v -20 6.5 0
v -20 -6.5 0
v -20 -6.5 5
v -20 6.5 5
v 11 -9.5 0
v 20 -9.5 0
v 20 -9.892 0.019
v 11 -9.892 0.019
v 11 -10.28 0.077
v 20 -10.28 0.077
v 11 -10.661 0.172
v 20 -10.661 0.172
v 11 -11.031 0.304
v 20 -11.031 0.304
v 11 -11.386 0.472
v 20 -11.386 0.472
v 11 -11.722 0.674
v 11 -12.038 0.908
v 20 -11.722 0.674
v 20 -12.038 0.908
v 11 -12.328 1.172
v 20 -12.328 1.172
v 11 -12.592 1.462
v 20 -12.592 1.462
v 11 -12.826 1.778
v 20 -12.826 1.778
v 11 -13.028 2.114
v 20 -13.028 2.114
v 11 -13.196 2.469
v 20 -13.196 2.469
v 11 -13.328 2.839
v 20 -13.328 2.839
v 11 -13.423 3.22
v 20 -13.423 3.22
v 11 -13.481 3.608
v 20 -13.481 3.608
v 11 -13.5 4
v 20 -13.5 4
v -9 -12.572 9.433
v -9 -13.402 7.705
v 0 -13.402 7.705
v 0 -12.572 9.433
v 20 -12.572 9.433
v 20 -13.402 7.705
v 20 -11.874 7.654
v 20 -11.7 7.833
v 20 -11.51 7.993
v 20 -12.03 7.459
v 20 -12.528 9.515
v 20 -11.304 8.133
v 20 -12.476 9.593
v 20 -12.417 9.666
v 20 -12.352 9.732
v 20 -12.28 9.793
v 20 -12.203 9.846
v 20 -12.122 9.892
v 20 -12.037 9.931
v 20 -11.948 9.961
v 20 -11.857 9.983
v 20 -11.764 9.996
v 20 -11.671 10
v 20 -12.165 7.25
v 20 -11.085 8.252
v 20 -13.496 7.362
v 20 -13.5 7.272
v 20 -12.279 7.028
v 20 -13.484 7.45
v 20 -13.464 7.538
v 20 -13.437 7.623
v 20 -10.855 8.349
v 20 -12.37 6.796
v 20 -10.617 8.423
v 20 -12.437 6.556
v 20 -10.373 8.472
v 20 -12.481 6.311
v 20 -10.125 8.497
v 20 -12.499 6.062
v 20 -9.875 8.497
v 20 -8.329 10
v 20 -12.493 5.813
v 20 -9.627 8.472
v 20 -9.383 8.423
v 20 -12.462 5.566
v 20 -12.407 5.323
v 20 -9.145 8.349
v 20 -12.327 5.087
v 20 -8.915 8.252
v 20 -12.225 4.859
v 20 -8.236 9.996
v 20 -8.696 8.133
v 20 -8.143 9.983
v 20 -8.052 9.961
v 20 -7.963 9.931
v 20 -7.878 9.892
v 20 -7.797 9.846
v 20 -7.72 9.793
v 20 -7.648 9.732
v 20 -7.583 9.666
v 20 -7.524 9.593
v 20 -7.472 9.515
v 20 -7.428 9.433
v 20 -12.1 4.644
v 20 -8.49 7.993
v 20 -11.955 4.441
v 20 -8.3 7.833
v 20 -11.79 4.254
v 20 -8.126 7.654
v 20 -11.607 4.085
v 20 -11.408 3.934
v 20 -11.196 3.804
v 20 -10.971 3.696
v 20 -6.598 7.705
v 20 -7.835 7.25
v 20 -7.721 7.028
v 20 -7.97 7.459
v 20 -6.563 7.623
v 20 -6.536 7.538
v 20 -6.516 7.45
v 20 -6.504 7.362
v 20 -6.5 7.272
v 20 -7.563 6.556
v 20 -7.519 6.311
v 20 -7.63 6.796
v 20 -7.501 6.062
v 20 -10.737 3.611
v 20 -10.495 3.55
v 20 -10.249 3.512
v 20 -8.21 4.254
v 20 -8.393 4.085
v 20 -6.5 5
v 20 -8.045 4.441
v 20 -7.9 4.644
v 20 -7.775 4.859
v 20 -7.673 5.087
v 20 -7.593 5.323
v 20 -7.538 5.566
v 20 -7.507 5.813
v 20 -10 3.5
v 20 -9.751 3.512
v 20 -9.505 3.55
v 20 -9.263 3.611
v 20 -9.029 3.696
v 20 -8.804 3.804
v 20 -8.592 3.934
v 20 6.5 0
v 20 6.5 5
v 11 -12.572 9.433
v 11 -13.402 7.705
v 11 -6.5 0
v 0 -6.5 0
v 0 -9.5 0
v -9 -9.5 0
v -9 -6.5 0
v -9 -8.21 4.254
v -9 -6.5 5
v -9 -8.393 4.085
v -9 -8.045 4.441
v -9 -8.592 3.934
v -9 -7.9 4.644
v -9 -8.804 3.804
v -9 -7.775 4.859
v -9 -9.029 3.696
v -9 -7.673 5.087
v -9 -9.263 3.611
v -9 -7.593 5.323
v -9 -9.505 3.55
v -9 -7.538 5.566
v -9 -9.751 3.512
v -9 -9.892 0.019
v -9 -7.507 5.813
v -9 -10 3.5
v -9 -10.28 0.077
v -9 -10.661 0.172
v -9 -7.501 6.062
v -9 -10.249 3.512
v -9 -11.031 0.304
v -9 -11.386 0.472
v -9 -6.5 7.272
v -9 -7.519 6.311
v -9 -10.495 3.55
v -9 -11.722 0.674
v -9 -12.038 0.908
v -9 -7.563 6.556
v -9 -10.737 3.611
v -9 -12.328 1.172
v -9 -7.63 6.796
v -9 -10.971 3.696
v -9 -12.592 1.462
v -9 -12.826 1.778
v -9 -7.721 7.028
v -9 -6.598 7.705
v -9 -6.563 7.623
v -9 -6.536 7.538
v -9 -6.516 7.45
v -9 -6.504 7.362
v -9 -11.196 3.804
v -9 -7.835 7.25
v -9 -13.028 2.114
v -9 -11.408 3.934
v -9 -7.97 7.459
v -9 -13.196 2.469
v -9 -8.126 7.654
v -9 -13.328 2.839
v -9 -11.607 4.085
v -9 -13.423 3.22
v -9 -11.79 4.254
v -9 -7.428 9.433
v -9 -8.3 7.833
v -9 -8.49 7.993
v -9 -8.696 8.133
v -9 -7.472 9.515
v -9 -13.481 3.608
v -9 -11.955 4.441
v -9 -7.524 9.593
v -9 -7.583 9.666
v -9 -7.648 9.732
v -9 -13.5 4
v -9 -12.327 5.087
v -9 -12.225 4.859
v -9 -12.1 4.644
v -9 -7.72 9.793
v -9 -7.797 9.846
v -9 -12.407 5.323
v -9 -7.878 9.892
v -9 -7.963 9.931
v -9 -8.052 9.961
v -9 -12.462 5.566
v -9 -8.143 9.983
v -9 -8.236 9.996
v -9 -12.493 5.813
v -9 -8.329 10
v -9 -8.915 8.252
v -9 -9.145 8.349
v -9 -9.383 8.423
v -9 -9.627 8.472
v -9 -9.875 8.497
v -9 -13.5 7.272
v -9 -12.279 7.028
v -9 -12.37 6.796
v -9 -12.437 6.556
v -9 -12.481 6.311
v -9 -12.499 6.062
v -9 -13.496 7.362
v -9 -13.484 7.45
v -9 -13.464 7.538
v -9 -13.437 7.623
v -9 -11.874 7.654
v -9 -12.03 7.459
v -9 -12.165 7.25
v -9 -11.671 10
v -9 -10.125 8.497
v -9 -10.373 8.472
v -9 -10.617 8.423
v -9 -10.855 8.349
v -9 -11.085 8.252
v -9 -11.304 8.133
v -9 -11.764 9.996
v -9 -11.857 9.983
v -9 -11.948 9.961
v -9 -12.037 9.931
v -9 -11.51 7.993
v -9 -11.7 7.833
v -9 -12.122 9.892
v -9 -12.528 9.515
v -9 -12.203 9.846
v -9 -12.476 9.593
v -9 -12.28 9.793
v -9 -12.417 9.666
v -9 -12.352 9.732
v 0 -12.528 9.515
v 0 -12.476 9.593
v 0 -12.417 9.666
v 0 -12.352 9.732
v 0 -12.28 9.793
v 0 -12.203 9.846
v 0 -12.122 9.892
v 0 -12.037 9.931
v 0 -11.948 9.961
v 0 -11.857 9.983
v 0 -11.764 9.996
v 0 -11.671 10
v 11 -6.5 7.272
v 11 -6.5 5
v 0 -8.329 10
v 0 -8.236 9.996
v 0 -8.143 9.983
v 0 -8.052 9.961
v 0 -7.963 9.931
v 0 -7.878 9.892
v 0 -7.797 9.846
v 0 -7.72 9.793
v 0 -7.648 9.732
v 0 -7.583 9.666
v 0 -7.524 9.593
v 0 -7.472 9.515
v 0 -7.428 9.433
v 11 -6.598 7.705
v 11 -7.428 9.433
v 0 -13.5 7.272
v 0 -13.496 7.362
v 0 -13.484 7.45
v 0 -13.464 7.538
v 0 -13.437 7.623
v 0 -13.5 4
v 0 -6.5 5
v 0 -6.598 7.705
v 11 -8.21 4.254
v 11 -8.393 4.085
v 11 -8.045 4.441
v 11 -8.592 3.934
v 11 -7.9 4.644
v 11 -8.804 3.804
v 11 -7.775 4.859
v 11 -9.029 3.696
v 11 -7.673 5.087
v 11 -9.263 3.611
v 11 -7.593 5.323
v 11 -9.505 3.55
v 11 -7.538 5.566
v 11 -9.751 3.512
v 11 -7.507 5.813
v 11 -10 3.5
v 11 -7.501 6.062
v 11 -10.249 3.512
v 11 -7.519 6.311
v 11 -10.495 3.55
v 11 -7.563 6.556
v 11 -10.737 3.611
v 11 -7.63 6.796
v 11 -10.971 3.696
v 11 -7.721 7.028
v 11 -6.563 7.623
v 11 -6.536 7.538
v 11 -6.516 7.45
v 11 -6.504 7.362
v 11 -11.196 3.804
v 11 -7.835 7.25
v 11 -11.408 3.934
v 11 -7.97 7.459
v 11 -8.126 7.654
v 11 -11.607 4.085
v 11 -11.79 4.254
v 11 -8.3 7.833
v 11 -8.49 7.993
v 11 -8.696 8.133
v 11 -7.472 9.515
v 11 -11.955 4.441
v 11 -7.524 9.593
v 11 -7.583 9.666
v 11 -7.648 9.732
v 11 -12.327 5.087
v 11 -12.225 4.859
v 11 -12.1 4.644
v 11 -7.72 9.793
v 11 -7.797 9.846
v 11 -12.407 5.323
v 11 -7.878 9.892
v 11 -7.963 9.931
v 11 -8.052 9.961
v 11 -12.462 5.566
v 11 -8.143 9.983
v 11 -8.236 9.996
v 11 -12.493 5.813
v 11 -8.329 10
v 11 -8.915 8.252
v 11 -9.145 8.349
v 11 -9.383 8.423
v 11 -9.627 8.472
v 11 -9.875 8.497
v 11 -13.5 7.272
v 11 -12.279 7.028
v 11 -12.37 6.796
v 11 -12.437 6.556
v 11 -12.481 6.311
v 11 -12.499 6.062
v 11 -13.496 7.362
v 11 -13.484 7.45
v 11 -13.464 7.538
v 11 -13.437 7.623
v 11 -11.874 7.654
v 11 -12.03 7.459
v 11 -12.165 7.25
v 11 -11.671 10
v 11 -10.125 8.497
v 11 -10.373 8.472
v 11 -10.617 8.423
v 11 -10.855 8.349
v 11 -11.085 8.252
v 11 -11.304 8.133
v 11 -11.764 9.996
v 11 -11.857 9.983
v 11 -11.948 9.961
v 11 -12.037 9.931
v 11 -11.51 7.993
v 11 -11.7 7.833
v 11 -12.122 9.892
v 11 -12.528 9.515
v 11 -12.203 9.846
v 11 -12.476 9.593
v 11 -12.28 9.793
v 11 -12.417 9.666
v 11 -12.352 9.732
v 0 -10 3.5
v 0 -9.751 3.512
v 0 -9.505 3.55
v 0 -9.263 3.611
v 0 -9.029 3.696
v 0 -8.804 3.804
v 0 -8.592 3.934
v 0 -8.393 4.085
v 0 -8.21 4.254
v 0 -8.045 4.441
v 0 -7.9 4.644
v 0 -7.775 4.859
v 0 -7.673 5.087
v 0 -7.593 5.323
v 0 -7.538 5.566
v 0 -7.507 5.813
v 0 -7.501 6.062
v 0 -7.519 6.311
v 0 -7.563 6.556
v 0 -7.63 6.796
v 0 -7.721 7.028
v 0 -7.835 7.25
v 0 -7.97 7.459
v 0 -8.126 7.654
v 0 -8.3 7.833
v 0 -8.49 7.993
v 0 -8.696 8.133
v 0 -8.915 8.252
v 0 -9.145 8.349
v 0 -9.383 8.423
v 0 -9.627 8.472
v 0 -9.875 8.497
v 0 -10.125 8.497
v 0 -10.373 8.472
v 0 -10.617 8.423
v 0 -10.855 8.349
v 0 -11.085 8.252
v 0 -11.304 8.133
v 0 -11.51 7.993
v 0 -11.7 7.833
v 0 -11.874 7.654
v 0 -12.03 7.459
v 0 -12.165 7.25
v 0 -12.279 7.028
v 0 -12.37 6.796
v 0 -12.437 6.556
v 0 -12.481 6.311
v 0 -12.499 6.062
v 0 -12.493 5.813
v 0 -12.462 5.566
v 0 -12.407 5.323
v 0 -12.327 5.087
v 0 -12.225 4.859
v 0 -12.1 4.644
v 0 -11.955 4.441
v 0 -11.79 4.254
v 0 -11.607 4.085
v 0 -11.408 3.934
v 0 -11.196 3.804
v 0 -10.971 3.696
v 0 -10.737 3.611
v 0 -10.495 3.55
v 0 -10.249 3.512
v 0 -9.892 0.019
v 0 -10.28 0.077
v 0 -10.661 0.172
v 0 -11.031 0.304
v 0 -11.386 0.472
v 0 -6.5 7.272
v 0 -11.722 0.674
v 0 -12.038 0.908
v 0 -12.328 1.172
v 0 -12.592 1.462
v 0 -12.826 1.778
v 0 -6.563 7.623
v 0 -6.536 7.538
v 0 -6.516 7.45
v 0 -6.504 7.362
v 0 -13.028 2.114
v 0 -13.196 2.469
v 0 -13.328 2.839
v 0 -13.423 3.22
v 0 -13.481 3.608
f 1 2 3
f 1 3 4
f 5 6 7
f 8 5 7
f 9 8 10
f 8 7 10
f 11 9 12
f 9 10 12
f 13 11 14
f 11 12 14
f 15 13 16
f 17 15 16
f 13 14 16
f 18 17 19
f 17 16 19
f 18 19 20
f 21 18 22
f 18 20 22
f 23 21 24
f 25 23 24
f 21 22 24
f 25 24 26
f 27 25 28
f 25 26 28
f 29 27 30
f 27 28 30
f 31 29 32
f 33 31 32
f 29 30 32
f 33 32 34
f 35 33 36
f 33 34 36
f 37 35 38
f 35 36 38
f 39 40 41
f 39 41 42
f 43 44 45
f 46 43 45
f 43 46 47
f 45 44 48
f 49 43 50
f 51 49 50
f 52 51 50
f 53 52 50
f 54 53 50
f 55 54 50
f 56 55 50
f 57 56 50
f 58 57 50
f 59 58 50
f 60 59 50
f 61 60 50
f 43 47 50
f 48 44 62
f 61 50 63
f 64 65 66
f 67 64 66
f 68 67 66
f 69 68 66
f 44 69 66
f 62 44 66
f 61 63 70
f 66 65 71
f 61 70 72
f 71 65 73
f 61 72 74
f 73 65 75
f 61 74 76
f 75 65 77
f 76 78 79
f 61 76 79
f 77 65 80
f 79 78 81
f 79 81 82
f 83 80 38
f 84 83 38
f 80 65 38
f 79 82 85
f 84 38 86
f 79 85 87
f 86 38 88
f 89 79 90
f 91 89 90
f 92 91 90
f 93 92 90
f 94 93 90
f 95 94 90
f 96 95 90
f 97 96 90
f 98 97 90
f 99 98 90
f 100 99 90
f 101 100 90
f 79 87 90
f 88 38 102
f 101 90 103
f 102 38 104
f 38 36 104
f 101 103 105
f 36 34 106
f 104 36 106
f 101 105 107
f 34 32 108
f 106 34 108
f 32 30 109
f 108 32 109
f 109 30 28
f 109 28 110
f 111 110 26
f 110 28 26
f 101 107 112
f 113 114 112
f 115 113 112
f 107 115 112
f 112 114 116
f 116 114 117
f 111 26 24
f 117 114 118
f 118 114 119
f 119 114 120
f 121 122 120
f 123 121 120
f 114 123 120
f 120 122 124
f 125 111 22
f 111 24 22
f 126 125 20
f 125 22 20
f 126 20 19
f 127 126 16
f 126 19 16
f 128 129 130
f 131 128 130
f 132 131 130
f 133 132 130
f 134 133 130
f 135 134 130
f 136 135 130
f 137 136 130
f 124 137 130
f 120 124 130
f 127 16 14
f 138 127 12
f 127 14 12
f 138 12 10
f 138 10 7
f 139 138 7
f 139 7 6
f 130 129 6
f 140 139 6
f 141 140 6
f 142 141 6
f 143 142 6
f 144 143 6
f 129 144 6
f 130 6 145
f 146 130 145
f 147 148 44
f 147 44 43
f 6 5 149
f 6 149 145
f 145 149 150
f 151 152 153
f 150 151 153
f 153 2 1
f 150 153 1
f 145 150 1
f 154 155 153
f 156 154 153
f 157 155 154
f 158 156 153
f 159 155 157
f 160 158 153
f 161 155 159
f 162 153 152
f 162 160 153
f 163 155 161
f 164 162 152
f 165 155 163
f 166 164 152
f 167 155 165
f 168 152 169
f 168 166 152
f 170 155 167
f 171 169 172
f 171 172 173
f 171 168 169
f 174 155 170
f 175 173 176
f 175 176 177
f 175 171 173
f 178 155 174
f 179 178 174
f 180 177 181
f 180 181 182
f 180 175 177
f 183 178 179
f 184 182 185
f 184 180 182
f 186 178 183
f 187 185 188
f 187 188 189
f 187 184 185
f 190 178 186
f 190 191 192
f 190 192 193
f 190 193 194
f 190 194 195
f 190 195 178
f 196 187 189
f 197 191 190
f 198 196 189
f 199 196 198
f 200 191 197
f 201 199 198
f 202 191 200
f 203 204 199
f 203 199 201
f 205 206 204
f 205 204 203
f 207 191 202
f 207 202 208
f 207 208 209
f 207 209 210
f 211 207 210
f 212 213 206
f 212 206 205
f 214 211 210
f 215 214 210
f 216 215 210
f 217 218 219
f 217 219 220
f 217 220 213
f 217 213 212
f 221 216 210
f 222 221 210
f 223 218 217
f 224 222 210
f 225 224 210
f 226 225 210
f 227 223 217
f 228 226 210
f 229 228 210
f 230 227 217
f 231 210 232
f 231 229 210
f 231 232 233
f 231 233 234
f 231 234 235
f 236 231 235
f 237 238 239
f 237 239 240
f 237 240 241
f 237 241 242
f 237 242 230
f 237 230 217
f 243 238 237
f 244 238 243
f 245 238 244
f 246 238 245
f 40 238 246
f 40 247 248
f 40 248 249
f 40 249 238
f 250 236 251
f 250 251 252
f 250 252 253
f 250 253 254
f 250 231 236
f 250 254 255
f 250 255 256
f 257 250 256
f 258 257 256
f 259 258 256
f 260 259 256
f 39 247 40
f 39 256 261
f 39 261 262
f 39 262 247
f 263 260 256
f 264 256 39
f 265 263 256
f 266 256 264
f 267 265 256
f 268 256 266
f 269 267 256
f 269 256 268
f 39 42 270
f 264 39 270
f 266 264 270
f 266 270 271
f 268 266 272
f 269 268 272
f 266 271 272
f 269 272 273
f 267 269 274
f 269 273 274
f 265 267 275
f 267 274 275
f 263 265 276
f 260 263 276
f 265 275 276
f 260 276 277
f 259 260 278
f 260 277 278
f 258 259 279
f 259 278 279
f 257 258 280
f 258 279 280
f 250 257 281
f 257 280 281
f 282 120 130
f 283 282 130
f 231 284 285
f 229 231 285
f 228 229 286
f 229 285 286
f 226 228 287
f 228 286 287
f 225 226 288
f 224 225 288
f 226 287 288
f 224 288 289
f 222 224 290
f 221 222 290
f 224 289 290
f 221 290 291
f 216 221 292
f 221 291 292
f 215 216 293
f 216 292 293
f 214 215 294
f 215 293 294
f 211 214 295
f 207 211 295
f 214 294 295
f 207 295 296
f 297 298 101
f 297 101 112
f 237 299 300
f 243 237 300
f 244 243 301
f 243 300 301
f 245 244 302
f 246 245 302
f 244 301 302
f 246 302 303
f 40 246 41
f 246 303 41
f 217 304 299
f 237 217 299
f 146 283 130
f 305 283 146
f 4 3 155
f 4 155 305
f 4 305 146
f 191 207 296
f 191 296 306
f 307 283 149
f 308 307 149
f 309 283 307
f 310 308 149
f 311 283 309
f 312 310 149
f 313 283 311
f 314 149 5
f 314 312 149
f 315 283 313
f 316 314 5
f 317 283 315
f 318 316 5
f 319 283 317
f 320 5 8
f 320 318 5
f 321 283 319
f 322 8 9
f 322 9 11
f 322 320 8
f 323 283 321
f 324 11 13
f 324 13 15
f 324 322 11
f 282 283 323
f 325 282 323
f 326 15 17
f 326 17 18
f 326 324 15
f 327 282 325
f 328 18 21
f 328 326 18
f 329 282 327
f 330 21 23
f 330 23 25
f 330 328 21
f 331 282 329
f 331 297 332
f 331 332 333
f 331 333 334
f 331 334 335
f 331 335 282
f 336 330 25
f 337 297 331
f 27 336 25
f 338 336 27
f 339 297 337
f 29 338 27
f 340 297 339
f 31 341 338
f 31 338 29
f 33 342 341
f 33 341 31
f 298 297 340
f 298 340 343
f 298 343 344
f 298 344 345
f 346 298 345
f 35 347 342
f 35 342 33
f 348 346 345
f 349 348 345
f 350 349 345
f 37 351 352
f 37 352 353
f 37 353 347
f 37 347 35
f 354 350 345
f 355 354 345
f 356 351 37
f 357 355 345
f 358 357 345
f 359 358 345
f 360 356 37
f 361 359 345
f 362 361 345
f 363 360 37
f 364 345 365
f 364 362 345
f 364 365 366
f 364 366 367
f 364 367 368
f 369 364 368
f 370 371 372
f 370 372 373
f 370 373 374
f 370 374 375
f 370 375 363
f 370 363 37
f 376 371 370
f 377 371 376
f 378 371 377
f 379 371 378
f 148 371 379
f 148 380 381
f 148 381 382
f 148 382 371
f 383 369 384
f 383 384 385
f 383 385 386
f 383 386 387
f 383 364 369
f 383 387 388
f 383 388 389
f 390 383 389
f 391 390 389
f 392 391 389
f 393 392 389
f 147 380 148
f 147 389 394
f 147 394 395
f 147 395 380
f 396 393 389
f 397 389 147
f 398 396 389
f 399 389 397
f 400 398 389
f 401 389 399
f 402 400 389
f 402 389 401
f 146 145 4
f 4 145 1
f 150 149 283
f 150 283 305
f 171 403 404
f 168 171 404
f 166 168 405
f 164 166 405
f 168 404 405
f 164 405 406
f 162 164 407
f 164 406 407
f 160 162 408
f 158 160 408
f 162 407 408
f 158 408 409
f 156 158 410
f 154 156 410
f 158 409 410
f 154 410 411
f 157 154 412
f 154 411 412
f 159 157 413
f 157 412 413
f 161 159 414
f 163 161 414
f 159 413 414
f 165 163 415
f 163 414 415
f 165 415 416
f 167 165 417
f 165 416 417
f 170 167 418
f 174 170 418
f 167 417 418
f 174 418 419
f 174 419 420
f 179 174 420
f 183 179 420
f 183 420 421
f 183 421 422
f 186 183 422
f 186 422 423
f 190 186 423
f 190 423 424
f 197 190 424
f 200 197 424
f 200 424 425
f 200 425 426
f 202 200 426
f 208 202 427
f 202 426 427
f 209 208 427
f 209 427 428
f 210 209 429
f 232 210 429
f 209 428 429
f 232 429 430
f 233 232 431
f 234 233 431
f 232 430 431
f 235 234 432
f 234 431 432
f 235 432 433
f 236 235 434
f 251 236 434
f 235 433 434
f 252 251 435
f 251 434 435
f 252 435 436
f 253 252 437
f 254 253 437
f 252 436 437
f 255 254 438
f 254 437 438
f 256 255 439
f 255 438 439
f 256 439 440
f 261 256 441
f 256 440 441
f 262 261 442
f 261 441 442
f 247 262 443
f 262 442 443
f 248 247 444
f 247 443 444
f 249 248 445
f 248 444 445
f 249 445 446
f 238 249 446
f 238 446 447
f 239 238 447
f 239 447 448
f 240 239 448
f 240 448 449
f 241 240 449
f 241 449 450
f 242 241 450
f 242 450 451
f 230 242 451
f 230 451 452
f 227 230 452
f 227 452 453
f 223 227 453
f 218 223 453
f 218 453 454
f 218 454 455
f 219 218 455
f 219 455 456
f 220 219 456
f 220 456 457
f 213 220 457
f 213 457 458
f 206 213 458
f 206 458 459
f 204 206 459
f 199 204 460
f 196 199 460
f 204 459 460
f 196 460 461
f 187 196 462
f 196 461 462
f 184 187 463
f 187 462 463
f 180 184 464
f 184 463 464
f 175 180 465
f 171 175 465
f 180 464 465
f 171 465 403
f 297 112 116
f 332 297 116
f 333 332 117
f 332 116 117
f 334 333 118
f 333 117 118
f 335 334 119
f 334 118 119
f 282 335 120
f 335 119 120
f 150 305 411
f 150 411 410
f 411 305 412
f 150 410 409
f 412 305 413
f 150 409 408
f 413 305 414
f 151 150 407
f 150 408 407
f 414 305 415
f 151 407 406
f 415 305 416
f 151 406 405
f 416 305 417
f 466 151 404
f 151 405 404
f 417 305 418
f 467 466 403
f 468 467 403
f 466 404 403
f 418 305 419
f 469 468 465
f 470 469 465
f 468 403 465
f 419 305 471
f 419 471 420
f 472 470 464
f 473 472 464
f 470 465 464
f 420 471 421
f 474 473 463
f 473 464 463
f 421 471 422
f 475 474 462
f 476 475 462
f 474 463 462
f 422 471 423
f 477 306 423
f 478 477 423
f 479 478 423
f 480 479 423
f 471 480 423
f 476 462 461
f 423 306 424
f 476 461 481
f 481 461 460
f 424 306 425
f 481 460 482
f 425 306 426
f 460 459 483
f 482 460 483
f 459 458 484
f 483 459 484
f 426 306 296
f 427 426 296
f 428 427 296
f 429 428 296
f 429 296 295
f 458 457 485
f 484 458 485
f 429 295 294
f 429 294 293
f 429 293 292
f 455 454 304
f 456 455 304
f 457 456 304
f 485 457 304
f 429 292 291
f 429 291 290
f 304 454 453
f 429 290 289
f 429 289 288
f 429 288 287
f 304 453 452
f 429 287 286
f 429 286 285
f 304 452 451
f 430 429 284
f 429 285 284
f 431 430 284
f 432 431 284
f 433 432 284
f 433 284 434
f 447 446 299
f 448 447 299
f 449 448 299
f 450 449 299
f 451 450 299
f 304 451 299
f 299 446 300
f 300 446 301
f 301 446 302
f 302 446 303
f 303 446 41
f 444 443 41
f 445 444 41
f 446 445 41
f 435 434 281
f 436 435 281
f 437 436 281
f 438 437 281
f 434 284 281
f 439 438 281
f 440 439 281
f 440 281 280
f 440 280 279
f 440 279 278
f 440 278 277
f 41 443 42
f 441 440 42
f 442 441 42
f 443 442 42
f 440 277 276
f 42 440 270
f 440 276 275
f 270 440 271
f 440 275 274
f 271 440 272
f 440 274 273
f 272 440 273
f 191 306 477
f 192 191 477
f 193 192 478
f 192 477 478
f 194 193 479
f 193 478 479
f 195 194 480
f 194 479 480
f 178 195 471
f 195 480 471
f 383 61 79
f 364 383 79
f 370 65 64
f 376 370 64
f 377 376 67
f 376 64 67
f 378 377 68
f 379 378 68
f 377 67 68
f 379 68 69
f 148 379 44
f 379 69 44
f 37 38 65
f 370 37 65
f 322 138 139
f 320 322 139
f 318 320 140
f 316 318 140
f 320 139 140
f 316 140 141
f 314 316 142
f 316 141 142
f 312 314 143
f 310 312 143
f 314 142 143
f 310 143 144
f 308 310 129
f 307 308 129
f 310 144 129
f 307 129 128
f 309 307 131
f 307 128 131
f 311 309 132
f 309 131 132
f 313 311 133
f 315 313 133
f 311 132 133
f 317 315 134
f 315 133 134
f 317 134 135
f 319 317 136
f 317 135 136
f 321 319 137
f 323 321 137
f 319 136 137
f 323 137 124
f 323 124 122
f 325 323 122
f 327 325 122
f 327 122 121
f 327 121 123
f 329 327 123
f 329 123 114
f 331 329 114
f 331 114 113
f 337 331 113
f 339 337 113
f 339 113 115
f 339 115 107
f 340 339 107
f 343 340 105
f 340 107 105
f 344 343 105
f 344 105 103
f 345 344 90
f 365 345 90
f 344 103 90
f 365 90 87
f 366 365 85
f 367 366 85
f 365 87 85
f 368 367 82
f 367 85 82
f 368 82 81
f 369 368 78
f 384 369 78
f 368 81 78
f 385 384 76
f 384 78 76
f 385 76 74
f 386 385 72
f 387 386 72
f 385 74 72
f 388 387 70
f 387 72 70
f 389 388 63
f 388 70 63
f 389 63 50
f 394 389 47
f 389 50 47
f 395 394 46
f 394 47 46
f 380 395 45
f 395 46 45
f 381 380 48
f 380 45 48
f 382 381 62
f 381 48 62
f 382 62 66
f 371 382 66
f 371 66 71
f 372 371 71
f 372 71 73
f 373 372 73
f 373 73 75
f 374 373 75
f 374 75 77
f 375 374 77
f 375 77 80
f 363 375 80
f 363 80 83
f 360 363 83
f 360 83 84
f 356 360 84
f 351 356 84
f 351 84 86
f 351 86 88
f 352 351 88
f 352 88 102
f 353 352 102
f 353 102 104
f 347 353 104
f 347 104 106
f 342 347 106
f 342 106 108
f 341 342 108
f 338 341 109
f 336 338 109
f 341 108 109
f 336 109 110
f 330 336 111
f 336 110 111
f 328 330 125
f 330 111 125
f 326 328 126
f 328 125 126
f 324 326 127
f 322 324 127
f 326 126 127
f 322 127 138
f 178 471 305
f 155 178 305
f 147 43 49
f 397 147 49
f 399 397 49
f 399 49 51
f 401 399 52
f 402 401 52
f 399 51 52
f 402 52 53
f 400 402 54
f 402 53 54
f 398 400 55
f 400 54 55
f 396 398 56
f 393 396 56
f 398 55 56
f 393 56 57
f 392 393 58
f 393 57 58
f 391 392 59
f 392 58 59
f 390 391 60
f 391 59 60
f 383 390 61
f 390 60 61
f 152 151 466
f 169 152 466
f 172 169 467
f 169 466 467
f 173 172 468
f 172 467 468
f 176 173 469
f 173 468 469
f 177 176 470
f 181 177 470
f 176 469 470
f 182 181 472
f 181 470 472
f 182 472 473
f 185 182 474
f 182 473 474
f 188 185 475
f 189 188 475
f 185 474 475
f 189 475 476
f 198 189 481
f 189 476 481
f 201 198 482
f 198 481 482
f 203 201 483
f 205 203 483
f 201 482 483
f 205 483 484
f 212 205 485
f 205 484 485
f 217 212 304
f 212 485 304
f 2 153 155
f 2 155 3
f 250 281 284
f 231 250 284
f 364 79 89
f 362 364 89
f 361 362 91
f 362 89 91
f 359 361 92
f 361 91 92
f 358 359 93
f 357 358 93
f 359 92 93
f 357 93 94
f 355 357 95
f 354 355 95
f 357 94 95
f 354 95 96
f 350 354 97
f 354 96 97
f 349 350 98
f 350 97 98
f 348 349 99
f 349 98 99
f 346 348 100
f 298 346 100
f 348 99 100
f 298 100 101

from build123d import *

# Parameters (mm, degrees)
SKETCH1_W           = 13
SKETCH1_H           = 40
BOSS_EXTRUDE1_DEPTH = 5
SKETCH2_R           = 2.5
BOSS_EXTRUDE2_DEPTH = 9
LPATTERN1_COUNT     = 2
LPATTERN1_PITCH     = 20


with BuildPart() as part:
    # Sketch1 → Boss-Extrude1 (new body)
    with BuildSketch(Plane(origin=(0, 0, 0), x_dir=(0, 1, 0), z_dir=(0, 0, 1))):
        Rectangle(SKETCH1_W, SKETCH1_H)
    extrude(amount=BOSS_EXTRUDE1_DEPTH)


with BuildPart() as body_2:
    # Sketch2 → Boss-Extrude2 (new body)
    with BuildSketch(Plane.YZ.offset(20)):
        with BuildLine():
            Line((-6.5, 0), (-9.5, 0))
            ThreePointArc((-9.5, 0), (-12.328427125, 1.171572875), (-13.5, 4))
            Line((-13.5, 4), (-13.5, 7.272429229))
            ThreePointArc((-13.5, 7.272429229), (-13.475070012, 7.494326663), (-13.401523057, 7.705160297))
            Line((-13.401523057, 7.705160297), (-12.572289088, 9.432731068))
            ThreePointArc((-12.572289088, 9.432731068), (-12.203339467, 9.846383798), (-11.67076603, 10))
            Line((-11.67076603, 10), (-8.32923397, 10))
            ThreePointArc((-8.32923397, 10), (-7.796660533, 9.846383798), (-7.427710912, 9.432731068))
            Line((-7.427710912, 9.432731068), (-6.598476943, 7.705160297))
            ThreePointArc((-6.598476943, 7.705160297), (-6.524929988, 7.494326663), (-6.5, 7.272429229))
            Line((-6.5, 7.272429229), (-6.5, 5))
            Line((-6.5, 5), (-6.5, 0))
        make_face()
        with Locations((-10, 6)):
            Circle(SKETCH2_R, mode=Mode.SUBTRACT)
    boss_extrude2 = extrude(amount=-BOSS_EXTRUDE2_DEPTH)


with BuildPart() as lpattern1_1:
    # LPattern1: Boss-Extrude2 ×2
    with Locations(*[(-i * LPATTERN1_PITCH, 0, 0) for i in range(1, LPATTERN1_COUNT)]):
        add(boss_extrude2)


with BuildPart() as body_2_1:
    add(body_2.part)

    # Combine1: union LPattern1_1, part
    add(lpattern1_1.part)
    add(part.part)


solid = body_2_1.part
